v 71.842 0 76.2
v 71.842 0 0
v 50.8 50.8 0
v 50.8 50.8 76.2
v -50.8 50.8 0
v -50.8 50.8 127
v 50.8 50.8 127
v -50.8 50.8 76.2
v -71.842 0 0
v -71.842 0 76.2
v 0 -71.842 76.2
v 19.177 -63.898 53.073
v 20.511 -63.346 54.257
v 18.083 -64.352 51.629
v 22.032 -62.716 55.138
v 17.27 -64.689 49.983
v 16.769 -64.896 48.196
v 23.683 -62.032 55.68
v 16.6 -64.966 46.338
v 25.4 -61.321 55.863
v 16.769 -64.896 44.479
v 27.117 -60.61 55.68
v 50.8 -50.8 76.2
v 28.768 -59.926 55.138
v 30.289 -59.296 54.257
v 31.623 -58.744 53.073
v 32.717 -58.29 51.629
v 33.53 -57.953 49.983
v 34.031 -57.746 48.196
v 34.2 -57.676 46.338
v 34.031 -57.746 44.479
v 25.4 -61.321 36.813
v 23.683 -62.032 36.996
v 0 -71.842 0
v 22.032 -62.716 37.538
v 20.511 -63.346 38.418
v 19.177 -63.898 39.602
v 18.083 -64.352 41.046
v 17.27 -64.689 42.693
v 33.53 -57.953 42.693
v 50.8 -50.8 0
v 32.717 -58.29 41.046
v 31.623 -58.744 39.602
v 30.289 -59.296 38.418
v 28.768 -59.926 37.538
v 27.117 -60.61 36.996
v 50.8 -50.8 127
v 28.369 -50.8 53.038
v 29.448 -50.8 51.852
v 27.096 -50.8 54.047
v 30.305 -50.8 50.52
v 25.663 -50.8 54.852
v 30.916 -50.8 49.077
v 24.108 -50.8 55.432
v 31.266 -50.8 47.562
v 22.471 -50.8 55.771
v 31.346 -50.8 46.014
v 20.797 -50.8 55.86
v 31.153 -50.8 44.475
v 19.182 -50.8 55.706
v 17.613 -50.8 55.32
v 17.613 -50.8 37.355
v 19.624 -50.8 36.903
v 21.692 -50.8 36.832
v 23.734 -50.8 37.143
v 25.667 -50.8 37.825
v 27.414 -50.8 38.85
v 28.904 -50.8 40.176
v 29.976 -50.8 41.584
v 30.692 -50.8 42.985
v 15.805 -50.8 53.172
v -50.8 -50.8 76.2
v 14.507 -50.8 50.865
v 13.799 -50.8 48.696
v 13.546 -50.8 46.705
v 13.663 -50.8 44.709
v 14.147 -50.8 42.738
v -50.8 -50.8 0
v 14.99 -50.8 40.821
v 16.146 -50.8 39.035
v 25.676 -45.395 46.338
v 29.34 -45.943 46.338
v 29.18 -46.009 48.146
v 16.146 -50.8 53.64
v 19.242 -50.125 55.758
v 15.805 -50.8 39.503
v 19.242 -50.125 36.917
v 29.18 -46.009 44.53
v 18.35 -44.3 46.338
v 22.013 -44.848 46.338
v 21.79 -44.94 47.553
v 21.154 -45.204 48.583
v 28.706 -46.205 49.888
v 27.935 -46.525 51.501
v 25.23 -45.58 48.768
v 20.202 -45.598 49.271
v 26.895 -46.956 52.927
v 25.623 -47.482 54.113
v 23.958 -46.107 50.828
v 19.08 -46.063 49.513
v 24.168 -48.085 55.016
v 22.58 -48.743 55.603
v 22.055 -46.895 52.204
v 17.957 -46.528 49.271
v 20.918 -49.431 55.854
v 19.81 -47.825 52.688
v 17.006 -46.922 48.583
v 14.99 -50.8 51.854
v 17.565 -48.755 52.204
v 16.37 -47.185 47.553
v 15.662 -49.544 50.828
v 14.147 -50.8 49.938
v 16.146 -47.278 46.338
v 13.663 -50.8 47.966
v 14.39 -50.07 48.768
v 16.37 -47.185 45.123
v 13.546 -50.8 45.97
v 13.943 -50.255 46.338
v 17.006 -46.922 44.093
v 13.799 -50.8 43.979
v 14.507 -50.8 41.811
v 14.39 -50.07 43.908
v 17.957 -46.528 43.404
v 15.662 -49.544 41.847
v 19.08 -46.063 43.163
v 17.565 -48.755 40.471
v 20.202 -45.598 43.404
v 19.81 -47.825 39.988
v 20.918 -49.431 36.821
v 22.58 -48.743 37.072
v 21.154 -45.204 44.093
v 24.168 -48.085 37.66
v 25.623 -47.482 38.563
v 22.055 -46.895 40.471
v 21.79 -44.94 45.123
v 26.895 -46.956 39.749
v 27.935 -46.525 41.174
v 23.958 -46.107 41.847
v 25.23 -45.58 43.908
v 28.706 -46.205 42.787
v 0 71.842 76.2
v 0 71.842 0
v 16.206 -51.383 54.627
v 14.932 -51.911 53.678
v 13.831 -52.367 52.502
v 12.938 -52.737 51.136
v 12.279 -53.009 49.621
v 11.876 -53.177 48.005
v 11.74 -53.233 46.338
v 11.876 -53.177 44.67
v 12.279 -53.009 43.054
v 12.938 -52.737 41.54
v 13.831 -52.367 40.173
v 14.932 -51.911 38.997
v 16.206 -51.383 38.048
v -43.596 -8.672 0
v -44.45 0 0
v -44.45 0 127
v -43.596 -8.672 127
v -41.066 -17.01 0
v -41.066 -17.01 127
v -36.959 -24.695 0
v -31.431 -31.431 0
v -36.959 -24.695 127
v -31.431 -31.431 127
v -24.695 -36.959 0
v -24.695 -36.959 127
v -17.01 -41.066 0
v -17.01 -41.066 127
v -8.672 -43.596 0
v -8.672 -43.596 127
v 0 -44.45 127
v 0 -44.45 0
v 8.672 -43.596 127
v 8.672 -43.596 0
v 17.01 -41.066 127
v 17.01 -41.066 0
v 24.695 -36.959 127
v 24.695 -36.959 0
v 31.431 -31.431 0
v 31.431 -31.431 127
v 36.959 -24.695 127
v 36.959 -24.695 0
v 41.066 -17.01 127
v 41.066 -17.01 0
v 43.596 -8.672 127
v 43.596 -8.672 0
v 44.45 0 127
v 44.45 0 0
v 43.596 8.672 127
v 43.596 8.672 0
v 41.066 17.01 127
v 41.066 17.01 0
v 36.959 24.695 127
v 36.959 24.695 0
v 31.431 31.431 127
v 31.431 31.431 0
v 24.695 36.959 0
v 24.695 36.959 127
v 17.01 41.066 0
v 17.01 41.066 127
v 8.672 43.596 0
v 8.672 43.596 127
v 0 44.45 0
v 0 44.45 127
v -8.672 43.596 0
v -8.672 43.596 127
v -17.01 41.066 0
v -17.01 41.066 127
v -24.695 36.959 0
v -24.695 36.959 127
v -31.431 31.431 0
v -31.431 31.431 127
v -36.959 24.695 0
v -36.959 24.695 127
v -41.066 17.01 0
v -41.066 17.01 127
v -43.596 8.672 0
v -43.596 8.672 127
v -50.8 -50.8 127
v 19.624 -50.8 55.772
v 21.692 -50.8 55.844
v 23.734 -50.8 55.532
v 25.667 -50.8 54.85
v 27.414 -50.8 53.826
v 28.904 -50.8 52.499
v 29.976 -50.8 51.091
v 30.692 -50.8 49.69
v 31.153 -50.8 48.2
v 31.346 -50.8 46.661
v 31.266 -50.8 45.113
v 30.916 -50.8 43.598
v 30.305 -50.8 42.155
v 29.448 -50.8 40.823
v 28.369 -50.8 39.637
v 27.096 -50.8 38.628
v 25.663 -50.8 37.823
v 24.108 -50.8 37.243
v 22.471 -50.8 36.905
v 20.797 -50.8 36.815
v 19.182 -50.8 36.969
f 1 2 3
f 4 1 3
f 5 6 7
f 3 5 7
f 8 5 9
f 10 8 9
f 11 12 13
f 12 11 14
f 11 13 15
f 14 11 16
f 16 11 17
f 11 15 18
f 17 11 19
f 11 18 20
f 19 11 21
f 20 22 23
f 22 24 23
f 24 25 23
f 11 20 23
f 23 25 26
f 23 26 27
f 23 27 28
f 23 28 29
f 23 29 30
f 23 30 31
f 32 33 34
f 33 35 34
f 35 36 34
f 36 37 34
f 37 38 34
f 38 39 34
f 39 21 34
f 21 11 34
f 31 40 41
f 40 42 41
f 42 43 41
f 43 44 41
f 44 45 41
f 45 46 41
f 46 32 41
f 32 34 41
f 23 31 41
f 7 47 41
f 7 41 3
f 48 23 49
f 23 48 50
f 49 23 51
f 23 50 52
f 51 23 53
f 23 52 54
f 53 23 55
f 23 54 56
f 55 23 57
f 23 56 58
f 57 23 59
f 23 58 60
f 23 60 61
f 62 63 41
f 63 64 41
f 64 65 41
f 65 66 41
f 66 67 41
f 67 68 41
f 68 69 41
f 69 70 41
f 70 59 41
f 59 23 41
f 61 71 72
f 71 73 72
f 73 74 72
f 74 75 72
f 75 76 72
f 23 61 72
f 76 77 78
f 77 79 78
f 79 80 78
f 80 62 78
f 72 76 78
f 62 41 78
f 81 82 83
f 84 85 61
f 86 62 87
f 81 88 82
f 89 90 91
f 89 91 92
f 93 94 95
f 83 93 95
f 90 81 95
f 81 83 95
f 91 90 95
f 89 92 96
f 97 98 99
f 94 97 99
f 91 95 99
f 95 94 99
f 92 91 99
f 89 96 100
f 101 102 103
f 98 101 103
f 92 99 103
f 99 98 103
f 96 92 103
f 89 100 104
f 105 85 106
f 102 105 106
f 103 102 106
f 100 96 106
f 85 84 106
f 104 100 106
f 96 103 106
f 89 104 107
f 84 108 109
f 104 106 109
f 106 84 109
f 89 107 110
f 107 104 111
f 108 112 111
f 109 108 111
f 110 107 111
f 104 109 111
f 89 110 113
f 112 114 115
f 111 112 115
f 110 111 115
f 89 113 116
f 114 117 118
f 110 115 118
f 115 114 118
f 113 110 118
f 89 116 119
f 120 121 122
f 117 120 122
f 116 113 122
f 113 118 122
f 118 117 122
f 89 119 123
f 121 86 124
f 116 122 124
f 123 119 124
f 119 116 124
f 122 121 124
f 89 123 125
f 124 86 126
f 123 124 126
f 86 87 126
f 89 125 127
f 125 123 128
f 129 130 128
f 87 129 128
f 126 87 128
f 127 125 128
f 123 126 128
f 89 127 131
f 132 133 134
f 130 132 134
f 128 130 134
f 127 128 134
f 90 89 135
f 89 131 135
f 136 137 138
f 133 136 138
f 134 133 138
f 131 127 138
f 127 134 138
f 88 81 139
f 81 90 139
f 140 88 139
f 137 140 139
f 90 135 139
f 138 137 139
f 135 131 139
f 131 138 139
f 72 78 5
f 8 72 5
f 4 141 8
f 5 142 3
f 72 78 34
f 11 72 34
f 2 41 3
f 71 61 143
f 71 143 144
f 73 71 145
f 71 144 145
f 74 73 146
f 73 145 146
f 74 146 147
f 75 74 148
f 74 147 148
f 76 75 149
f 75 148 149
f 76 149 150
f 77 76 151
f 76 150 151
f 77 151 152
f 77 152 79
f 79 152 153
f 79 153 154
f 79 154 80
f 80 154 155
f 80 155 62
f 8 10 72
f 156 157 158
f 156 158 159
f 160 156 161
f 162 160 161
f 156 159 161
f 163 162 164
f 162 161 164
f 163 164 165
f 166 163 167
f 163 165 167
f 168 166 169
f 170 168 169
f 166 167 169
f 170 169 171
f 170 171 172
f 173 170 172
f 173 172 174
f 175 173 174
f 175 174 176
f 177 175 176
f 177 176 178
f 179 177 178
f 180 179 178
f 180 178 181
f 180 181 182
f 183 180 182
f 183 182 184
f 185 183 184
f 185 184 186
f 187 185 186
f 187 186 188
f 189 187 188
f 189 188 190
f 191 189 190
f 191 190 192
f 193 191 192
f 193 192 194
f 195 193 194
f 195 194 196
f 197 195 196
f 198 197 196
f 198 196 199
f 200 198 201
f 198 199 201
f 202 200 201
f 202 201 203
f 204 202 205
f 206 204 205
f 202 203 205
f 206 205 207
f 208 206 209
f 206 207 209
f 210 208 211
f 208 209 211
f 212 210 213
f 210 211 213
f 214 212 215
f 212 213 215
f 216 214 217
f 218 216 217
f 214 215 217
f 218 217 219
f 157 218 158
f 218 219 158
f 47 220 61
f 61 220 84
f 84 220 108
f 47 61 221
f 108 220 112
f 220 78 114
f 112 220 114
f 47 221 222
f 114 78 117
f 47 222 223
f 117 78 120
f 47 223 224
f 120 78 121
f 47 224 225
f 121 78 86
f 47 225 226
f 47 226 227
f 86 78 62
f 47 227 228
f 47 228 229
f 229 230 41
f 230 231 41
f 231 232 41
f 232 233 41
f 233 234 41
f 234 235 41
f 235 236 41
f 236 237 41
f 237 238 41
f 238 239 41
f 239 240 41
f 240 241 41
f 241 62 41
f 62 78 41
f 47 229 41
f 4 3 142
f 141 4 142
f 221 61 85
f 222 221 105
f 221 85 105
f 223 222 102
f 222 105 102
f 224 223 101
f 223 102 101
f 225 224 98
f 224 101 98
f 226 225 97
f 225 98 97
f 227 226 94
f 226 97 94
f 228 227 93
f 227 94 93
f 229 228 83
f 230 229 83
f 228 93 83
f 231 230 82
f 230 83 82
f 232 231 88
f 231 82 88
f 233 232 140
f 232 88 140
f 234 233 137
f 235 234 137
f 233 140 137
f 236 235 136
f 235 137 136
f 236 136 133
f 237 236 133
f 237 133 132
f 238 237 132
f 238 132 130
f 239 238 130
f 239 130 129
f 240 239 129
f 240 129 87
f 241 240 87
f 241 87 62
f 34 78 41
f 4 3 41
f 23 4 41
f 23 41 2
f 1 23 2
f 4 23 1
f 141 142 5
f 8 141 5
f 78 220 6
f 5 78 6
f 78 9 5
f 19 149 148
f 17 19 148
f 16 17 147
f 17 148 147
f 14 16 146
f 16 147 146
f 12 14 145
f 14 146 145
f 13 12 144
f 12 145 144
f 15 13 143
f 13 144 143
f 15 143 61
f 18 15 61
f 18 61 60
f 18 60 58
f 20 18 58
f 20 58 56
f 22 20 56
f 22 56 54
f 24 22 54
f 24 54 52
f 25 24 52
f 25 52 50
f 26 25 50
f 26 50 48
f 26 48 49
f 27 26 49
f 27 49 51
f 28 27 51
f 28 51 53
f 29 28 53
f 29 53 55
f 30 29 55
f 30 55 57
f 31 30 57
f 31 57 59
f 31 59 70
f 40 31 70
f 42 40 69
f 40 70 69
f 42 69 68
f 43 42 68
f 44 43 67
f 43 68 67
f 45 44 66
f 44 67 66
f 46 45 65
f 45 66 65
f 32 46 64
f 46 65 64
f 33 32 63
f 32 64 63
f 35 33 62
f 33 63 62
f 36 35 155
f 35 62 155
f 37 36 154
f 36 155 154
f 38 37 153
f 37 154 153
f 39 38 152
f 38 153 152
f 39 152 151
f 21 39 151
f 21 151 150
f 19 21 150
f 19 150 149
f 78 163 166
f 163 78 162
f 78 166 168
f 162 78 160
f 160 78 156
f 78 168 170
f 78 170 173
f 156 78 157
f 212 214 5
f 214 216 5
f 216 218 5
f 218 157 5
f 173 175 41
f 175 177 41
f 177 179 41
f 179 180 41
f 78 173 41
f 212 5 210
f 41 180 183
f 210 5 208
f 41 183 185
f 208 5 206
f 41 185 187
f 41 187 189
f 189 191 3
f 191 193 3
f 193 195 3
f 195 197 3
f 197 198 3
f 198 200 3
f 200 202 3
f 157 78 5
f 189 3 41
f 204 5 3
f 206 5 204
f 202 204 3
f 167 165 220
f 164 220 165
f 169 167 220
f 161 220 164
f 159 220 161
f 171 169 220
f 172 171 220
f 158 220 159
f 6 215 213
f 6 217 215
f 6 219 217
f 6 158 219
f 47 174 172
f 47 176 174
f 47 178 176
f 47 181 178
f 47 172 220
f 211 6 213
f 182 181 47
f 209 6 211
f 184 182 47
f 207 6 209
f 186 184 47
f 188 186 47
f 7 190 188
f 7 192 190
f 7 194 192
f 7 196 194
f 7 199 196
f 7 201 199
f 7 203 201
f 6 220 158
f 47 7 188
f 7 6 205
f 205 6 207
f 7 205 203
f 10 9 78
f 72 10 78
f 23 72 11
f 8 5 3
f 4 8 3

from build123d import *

# Parameters (mm, degrees)
F1_DEPTH   = 76.2
F0_W       = 101.6
F0_H       = 101.6
F2_DEPTH   = 127
F3_D       = 88.9
F5_D       = 19.05
F5_DEPTH   = 12.7
F5_TIP     = 5.7231973962
F5_2_D     = 19.05
F5_2_DEPTH = 12.7
F5_2_TIP   = 5.7231973962


with BuildPart() as f1:
    # F0 (on Top) → F1 (new body)
    with BuildSketch(Plane.XY):
        Polygon((0, -71.8420489686), (50.8, -50.8), (-50.8, -50.8), align=None)
    extrude(amount=F1_DEPTH)

    # F5
    with Locations(Plane(origin=(25.4, -61.3210244843, 0), x_dir=(0.9238795325, 0.3826834324, 0), z_dir=(0.3826834324, -0.9238795325, 0))):
        with Locations((0, 46.3376045227)):
            Hole(F5_D / 2, depth=F5_DEPTH)
            with Locations((0, 0, -(F5_DEPTH + F5_TIP / 2))):  # 118° drill point
                Cone(0, F5_D / 2, F5_TIP, mode=Mode.SUBTRACT)


with BuildPart() as f1b:
    # F0 (on Top) → F1, piece 2 (new body)
    with BuildSketch(Plane.XY):
        Polygon((-50.8, 50.8), (50.8, 50.8), (0, 71.8420489686), align=None)
    extrude(amount=F1_DEPTH)


with BuildPart() as f1c:
    # F0 (on Top) → F1, piece 3 (new body)
    with BuildSketch(Plane.XY):
        Polygon((50.8, 50.8), (50.8, -50.8), (71.8420489686, 0), align=None)
    extrude(amount=F1_DEPTH)


with BuildPart() as f1d:
    # F0 (on Top) → F1, piece 4 (new body)
    with BuildSketch(Plane.XY):
        Polygon((-71.8420489686, 0), (-50.8, -50.8), (-50.8, 50.8), align=None)
    extrude(amount=F1_DEPTH)


with BuildPart() as f2:
    # F0 (on Top) → F2 (new body)
    with BuildSketch(Plane.XY):
        Rectangle(F0_W, F0_H)
    extrude(amount=F2_DEPTH)

    # F3 (through all)
    with Locations(Plane(origin=(0, 0, 0), x_dir=(1, 0, 0), z_dir=(0, 0, -1))):
        with Locations((0, 0)):
            Hole(F3_D / 2)

    # F5#2
    with Locations(Plane(origin=(25.4, -61.3210244843, 0), x_dir=(0.9238795325, 0.3826834324, 0), z_dir=(0.3826834324, -0.9238795325, 0))):
        with Locations((0, 46.3376045227)):
            Hole(F5_2_D / 2, depth=F5_2_DEPTH)
            with Locations((0, 0, -(F5_2_DEPTH + F5_2_TIP / 2))):  # 118° drill point
                Cone(0, F5_2_D / 2, F5_2_TIP, mode=Mode.SUBTRACT)


solid = Compound([f1.part, f1b.part, f1c.part, f1d.part, f2.part])
